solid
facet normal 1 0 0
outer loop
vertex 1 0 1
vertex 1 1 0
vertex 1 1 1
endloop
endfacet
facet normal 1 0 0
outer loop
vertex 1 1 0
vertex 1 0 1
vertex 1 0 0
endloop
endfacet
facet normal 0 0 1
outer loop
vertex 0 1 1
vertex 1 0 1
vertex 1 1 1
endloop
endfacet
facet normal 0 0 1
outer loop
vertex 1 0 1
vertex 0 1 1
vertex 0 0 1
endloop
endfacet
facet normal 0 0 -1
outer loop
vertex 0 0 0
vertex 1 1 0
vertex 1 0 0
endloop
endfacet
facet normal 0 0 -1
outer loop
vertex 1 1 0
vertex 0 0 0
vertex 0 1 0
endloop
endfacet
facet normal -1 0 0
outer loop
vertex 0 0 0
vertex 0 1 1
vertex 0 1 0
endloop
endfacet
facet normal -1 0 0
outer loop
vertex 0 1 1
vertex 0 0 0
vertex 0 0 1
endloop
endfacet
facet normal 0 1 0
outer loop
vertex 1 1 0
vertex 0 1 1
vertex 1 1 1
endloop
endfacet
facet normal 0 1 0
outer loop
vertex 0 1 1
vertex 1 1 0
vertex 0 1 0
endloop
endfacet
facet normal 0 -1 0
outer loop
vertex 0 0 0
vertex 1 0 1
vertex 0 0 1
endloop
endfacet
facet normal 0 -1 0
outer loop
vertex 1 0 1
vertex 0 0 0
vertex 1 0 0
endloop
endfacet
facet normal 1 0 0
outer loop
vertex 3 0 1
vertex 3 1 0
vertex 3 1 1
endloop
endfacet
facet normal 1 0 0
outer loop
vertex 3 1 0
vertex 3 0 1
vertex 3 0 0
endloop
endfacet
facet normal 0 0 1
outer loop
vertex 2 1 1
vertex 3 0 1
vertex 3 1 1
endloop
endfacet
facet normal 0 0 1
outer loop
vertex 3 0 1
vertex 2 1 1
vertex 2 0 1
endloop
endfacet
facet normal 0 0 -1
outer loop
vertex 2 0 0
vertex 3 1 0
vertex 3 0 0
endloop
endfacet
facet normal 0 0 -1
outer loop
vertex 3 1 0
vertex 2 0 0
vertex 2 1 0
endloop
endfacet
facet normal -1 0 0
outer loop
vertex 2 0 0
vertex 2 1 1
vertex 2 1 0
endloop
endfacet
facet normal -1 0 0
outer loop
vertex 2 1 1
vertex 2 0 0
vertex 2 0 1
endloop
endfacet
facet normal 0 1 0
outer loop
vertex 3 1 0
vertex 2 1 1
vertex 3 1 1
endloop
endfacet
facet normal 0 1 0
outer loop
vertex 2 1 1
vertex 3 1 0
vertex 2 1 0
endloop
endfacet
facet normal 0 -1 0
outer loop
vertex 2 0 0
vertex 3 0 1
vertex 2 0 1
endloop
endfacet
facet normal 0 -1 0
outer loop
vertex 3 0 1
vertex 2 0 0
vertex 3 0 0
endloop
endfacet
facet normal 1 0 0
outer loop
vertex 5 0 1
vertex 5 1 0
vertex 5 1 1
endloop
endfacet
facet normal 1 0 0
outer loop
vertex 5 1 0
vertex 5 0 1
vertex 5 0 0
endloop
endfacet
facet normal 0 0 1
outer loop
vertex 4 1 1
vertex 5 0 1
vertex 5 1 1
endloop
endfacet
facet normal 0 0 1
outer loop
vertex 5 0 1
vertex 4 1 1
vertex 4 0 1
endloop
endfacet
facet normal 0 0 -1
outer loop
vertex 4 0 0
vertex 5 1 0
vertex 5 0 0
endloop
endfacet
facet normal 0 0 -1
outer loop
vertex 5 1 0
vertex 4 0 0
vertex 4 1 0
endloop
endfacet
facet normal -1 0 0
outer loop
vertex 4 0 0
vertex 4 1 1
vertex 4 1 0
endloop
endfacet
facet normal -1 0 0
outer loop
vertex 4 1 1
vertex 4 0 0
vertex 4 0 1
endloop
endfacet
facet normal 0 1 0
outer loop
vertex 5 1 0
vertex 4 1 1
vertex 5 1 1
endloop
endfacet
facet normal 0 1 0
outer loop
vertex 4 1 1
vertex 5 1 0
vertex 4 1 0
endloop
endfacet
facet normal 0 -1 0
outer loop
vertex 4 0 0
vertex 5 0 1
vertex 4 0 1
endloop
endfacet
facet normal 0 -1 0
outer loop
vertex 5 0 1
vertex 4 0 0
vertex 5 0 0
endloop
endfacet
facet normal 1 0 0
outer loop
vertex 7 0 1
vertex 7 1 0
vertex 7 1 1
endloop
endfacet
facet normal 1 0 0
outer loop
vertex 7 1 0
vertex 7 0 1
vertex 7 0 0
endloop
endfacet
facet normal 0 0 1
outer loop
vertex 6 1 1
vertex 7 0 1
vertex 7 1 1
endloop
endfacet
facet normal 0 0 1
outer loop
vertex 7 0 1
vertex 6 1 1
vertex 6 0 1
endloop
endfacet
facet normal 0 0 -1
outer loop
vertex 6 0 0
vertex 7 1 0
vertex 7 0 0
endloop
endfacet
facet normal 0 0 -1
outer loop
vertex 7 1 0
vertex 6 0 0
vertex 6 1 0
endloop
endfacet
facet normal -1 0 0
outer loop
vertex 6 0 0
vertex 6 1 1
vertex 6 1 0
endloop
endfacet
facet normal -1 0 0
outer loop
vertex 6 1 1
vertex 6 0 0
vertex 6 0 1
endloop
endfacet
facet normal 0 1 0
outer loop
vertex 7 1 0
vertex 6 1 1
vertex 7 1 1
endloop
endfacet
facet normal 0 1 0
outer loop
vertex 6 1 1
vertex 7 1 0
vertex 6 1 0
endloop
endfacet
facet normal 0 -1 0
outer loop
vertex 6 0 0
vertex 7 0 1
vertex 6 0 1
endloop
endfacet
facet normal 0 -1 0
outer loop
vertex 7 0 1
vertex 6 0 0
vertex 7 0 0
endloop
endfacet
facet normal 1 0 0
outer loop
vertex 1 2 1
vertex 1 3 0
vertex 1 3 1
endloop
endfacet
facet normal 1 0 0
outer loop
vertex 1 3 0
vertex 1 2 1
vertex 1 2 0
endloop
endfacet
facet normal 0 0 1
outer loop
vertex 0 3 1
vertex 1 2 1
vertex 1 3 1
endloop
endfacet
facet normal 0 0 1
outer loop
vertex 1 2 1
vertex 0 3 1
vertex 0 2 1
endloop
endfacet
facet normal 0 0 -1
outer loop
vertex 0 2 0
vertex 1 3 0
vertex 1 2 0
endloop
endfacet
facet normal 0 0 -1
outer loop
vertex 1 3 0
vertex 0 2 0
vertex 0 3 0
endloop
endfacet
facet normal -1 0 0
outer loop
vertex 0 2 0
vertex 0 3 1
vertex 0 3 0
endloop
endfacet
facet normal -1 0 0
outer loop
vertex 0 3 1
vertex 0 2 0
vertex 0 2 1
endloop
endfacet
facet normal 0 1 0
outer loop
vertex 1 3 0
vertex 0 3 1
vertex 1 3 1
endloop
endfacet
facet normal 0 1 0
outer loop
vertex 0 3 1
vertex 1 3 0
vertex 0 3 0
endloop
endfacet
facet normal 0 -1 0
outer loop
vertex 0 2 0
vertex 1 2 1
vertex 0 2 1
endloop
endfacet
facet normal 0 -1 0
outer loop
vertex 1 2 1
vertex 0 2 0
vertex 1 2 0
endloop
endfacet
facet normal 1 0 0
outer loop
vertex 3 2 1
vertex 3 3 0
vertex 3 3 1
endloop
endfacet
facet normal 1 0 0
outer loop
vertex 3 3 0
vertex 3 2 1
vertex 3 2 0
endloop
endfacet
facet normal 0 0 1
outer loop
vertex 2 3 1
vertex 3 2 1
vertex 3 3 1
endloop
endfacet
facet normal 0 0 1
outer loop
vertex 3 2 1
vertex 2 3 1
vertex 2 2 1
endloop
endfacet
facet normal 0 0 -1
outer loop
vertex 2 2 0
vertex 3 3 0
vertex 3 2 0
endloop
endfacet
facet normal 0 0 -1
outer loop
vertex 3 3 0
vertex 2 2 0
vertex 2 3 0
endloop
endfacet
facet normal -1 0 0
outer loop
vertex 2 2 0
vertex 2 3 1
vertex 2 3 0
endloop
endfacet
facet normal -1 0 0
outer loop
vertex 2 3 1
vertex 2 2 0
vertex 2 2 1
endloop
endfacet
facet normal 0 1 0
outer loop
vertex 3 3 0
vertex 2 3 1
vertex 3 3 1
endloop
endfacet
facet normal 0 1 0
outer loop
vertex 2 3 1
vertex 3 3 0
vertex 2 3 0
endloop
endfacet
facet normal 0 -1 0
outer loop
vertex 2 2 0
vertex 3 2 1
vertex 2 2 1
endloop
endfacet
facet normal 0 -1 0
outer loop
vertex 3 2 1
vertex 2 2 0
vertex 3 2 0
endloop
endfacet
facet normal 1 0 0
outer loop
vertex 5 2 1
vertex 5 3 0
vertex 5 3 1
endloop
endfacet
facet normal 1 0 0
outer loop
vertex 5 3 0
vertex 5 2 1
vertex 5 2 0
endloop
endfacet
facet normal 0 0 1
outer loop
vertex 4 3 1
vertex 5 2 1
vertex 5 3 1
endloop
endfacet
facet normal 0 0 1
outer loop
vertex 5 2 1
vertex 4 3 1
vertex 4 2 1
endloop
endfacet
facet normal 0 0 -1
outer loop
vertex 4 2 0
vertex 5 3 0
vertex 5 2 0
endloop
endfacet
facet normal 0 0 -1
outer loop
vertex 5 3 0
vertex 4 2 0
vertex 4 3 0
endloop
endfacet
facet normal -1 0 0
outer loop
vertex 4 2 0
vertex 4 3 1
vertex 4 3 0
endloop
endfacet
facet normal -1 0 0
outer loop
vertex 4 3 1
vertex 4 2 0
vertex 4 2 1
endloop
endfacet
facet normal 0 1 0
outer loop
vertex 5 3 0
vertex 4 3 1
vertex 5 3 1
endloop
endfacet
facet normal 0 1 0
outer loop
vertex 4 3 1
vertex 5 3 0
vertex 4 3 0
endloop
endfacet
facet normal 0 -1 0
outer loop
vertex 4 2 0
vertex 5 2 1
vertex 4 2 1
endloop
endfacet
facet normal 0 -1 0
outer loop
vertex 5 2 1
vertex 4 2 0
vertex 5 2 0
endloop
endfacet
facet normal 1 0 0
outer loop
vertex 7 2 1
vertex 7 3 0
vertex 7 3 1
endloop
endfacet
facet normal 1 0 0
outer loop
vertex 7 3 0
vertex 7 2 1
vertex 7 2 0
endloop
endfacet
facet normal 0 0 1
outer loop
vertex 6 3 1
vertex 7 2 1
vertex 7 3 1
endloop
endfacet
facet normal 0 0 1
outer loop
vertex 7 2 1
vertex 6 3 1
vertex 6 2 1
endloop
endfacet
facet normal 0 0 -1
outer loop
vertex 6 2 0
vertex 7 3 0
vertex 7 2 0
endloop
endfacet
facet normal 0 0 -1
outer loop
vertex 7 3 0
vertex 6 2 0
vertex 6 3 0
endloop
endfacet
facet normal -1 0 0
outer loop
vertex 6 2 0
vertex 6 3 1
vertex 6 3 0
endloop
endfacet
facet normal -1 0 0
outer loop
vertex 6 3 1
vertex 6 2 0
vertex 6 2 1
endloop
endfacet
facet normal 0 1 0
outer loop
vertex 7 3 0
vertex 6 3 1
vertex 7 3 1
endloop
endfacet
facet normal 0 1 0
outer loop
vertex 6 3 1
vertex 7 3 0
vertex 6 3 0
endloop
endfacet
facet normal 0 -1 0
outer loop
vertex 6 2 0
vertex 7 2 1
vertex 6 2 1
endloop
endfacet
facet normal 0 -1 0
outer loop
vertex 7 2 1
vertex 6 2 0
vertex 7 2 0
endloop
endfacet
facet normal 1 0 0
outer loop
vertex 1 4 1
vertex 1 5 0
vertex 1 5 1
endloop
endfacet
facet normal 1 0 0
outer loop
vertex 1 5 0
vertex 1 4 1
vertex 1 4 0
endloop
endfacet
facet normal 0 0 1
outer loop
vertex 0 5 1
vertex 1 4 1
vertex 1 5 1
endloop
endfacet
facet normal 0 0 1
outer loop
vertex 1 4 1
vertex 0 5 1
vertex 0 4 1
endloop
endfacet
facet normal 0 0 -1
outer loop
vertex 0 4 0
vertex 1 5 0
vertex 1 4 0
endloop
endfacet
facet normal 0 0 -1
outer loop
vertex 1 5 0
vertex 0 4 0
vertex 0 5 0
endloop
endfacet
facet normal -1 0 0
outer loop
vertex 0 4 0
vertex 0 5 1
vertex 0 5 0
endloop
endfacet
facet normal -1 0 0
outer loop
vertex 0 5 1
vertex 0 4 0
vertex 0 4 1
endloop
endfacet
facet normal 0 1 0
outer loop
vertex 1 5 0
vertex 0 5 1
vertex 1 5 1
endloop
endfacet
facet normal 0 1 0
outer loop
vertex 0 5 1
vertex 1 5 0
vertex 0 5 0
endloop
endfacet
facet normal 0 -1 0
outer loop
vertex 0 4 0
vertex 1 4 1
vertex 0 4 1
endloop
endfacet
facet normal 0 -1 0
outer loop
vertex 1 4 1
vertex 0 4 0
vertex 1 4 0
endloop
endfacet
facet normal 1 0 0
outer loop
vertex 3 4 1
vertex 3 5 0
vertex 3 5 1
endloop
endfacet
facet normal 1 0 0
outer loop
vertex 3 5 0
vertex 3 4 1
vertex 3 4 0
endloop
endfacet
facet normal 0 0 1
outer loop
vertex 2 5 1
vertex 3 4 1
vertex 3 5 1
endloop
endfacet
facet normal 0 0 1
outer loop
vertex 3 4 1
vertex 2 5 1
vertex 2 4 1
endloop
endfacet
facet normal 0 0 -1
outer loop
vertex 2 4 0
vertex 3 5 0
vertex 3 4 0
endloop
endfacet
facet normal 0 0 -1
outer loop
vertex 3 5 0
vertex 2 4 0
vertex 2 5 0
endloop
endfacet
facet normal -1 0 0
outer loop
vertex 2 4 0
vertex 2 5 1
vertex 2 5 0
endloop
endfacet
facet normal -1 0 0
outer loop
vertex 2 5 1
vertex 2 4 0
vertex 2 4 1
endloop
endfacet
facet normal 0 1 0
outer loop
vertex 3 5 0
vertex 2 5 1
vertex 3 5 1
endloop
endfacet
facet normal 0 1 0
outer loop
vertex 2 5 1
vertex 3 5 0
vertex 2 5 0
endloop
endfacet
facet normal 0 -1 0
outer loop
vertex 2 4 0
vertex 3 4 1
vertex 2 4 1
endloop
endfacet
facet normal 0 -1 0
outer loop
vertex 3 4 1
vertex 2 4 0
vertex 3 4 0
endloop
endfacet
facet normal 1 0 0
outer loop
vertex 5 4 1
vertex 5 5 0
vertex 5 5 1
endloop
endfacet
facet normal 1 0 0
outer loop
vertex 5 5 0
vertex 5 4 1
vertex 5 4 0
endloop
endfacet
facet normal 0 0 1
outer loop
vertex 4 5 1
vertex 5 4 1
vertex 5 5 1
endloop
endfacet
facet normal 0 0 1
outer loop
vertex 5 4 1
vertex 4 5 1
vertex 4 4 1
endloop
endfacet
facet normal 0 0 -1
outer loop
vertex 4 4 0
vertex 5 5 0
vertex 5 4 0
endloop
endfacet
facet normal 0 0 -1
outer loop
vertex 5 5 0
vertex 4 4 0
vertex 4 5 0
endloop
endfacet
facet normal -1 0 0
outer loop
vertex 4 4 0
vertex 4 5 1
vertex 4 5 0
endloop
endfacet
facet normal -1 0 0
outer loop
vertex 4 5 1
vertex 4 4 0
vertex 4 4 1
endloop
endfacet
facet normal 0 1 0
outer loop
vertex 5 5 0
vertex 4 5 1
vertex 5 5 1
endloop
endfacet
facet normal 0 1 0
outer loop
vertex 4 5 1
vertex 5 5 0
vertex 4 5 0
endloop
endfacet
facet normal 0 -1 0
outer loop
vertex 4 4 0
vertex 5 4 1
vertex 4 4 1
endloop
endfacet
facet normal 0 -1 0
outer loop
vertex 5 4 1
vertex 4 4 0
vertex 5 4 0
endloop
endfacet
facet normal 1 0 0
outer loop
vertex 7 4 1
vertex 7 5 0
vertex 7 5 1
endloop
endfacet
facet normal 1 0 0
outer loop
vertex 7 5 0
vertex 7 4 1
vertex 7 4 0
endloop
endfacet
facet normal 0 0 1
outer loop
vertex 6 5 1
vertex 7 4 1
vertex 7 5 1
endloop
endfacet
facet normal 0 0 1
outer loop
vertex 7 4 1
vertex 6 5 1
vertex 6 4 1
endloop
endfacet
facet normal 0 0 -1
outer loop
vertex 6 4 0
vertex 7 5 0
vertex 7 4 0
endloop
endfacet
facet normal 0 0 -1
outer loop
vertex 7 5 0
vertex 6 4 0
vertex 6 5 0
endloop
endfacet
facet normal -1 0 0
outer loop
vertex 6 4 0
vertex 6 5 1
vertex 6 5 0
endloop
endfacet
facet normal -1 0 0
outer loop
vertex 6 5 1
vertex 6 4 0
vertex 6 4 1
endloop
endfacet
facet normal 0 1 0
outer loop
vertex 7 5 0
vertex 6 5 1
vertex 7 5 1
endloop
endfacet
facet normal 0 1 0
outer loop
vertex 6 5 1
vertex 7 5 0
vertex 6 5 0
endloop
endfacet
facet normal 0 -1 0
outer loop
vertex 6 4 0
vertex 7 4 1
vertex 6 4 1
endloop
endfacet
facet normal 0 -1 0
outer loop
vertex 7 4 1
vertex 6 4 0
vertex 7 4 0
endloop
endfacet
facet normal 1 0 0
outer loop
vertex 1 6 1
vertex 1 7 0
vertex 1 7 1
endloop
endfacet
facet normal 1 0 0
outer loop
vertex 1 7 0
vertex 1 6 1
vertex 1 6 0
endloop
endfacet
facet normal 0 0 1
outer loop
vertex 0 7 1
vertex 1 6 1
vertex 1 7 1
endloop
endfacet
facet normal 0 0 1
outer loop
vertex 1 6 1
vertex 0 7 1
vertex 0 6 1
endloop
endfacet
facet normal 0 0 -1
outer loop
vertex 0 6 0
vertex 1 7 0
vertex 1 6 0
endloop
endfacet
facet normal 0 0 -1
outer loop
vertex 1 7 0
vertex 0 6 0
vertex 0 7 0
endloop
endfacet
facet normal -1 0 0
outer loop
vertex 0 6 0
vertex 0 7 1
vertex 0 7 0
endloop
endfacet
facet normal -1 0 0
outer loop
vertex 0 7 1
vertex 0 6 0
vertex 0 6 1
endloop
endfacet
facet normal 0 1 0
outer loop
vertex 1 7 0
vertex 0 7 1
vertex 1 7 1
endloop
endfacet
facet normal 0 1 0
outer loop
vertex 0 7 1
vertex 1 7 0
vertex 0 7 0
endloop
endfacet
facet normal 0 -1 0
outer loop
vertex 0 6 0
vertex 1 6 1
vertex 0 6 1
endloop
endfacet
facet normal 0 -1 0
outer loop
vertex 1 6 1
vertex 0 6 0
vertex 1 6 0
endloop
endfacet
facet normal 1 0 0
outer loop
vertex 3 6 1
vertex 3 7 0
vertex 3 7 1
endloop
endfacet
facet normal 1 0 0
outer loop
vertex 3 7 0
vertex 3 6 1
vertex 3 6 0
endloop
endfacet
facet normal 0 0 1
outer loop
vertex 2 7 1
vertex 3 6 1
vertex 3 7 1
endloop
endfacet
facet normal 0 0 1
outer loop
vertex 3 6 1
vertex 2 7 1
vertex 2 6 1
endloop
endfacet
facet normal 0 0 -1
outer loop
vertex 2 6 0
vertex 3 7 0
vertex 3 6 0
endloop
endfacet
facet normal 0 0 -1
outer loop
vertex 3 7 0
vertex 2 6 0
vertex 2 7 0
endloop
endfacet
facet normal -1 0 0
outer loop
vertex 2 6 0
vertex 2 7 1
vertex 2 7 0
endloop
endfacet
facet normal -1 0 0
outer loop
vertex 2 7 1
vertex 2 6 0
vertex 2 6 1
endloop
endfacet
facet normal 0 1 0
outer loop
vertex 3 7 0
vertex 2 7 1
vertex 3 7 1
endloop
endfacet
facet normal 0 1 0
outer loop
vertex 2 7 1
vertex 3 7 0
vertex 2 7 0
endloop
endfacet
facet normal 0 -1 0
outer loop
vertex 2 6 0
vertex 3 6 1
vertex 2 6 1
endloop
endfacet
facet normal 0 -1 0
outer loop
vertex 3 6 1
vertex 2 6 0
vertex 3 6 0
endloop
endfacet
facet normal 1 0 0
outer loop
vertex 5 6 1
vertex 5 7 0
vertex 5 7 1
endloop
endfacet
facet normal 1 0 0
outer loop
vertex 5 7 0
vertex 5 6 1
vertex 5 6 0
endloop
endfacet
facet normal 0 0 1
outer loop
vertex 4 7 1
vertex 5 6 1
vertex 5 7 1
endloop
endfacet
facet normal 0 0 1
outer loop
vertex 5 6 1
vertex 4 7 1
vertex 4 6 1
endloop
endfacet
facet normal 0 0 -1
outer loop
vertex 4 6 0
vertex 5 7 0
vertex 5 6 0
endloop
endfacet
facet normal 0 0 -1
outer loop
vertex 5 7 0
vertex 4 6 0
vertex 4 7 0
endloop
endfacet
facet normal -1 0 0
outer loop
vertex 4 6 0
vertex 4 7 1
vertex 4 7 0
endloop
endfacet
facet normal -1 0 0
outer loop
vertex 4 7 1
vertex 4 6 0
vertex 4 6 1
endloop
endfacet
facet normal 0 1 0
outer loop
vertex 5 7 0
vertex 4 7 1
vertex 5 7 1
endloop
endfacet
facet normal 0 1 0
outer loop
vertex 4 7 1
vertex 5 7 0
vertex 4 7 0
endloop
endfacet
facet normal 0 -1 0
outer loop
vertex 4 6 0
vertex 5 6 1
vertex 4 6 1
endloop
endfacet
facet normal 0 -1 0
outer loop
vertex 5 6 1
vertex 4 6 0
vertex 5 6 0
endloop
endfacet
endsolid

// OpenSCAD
union() {
	translate([0, 0, 0]) cube(size=[1,1,1], center=false);
	translate([2, 0, 0]) cube(size=[1,1,1], center=false);
	translate([4, 0, 0]) cube(size=[1,1,1], center=false);
	translate([6, 0, 0]) cube(size=[1,1,1], center=false);
	translate([0, 2, 0]) cube(size=[1,1,1], center=false);
	translate([2, 2, 0]) cube(size=[1,1,1], center=false);
	translate([4, 2, 0]) cube(size=[1,1,1], center=false);
	translate([6, 2, 0]) cube(size=[1,1,1], center=false);
	translate([0, 4, 0]) cube(size=[1,1,1], center=false);
	translate([2, 4, 0]) cube(size=[1,1,1], center=false);
	translate([4, 4, 0]) cube(size=[1,1,1], center=false);
	translate([6, 4, 0]) cube(size=[1,1,1], center=false);
	translate([0, 6, 0]) cube(size=[1,1,1], center=false);
	translate([2, 6, 0]) cube(size=[1,1,1], center=false);
	translate([4, 6, 0]) cube(size=[1,1,1], center=false);
}
